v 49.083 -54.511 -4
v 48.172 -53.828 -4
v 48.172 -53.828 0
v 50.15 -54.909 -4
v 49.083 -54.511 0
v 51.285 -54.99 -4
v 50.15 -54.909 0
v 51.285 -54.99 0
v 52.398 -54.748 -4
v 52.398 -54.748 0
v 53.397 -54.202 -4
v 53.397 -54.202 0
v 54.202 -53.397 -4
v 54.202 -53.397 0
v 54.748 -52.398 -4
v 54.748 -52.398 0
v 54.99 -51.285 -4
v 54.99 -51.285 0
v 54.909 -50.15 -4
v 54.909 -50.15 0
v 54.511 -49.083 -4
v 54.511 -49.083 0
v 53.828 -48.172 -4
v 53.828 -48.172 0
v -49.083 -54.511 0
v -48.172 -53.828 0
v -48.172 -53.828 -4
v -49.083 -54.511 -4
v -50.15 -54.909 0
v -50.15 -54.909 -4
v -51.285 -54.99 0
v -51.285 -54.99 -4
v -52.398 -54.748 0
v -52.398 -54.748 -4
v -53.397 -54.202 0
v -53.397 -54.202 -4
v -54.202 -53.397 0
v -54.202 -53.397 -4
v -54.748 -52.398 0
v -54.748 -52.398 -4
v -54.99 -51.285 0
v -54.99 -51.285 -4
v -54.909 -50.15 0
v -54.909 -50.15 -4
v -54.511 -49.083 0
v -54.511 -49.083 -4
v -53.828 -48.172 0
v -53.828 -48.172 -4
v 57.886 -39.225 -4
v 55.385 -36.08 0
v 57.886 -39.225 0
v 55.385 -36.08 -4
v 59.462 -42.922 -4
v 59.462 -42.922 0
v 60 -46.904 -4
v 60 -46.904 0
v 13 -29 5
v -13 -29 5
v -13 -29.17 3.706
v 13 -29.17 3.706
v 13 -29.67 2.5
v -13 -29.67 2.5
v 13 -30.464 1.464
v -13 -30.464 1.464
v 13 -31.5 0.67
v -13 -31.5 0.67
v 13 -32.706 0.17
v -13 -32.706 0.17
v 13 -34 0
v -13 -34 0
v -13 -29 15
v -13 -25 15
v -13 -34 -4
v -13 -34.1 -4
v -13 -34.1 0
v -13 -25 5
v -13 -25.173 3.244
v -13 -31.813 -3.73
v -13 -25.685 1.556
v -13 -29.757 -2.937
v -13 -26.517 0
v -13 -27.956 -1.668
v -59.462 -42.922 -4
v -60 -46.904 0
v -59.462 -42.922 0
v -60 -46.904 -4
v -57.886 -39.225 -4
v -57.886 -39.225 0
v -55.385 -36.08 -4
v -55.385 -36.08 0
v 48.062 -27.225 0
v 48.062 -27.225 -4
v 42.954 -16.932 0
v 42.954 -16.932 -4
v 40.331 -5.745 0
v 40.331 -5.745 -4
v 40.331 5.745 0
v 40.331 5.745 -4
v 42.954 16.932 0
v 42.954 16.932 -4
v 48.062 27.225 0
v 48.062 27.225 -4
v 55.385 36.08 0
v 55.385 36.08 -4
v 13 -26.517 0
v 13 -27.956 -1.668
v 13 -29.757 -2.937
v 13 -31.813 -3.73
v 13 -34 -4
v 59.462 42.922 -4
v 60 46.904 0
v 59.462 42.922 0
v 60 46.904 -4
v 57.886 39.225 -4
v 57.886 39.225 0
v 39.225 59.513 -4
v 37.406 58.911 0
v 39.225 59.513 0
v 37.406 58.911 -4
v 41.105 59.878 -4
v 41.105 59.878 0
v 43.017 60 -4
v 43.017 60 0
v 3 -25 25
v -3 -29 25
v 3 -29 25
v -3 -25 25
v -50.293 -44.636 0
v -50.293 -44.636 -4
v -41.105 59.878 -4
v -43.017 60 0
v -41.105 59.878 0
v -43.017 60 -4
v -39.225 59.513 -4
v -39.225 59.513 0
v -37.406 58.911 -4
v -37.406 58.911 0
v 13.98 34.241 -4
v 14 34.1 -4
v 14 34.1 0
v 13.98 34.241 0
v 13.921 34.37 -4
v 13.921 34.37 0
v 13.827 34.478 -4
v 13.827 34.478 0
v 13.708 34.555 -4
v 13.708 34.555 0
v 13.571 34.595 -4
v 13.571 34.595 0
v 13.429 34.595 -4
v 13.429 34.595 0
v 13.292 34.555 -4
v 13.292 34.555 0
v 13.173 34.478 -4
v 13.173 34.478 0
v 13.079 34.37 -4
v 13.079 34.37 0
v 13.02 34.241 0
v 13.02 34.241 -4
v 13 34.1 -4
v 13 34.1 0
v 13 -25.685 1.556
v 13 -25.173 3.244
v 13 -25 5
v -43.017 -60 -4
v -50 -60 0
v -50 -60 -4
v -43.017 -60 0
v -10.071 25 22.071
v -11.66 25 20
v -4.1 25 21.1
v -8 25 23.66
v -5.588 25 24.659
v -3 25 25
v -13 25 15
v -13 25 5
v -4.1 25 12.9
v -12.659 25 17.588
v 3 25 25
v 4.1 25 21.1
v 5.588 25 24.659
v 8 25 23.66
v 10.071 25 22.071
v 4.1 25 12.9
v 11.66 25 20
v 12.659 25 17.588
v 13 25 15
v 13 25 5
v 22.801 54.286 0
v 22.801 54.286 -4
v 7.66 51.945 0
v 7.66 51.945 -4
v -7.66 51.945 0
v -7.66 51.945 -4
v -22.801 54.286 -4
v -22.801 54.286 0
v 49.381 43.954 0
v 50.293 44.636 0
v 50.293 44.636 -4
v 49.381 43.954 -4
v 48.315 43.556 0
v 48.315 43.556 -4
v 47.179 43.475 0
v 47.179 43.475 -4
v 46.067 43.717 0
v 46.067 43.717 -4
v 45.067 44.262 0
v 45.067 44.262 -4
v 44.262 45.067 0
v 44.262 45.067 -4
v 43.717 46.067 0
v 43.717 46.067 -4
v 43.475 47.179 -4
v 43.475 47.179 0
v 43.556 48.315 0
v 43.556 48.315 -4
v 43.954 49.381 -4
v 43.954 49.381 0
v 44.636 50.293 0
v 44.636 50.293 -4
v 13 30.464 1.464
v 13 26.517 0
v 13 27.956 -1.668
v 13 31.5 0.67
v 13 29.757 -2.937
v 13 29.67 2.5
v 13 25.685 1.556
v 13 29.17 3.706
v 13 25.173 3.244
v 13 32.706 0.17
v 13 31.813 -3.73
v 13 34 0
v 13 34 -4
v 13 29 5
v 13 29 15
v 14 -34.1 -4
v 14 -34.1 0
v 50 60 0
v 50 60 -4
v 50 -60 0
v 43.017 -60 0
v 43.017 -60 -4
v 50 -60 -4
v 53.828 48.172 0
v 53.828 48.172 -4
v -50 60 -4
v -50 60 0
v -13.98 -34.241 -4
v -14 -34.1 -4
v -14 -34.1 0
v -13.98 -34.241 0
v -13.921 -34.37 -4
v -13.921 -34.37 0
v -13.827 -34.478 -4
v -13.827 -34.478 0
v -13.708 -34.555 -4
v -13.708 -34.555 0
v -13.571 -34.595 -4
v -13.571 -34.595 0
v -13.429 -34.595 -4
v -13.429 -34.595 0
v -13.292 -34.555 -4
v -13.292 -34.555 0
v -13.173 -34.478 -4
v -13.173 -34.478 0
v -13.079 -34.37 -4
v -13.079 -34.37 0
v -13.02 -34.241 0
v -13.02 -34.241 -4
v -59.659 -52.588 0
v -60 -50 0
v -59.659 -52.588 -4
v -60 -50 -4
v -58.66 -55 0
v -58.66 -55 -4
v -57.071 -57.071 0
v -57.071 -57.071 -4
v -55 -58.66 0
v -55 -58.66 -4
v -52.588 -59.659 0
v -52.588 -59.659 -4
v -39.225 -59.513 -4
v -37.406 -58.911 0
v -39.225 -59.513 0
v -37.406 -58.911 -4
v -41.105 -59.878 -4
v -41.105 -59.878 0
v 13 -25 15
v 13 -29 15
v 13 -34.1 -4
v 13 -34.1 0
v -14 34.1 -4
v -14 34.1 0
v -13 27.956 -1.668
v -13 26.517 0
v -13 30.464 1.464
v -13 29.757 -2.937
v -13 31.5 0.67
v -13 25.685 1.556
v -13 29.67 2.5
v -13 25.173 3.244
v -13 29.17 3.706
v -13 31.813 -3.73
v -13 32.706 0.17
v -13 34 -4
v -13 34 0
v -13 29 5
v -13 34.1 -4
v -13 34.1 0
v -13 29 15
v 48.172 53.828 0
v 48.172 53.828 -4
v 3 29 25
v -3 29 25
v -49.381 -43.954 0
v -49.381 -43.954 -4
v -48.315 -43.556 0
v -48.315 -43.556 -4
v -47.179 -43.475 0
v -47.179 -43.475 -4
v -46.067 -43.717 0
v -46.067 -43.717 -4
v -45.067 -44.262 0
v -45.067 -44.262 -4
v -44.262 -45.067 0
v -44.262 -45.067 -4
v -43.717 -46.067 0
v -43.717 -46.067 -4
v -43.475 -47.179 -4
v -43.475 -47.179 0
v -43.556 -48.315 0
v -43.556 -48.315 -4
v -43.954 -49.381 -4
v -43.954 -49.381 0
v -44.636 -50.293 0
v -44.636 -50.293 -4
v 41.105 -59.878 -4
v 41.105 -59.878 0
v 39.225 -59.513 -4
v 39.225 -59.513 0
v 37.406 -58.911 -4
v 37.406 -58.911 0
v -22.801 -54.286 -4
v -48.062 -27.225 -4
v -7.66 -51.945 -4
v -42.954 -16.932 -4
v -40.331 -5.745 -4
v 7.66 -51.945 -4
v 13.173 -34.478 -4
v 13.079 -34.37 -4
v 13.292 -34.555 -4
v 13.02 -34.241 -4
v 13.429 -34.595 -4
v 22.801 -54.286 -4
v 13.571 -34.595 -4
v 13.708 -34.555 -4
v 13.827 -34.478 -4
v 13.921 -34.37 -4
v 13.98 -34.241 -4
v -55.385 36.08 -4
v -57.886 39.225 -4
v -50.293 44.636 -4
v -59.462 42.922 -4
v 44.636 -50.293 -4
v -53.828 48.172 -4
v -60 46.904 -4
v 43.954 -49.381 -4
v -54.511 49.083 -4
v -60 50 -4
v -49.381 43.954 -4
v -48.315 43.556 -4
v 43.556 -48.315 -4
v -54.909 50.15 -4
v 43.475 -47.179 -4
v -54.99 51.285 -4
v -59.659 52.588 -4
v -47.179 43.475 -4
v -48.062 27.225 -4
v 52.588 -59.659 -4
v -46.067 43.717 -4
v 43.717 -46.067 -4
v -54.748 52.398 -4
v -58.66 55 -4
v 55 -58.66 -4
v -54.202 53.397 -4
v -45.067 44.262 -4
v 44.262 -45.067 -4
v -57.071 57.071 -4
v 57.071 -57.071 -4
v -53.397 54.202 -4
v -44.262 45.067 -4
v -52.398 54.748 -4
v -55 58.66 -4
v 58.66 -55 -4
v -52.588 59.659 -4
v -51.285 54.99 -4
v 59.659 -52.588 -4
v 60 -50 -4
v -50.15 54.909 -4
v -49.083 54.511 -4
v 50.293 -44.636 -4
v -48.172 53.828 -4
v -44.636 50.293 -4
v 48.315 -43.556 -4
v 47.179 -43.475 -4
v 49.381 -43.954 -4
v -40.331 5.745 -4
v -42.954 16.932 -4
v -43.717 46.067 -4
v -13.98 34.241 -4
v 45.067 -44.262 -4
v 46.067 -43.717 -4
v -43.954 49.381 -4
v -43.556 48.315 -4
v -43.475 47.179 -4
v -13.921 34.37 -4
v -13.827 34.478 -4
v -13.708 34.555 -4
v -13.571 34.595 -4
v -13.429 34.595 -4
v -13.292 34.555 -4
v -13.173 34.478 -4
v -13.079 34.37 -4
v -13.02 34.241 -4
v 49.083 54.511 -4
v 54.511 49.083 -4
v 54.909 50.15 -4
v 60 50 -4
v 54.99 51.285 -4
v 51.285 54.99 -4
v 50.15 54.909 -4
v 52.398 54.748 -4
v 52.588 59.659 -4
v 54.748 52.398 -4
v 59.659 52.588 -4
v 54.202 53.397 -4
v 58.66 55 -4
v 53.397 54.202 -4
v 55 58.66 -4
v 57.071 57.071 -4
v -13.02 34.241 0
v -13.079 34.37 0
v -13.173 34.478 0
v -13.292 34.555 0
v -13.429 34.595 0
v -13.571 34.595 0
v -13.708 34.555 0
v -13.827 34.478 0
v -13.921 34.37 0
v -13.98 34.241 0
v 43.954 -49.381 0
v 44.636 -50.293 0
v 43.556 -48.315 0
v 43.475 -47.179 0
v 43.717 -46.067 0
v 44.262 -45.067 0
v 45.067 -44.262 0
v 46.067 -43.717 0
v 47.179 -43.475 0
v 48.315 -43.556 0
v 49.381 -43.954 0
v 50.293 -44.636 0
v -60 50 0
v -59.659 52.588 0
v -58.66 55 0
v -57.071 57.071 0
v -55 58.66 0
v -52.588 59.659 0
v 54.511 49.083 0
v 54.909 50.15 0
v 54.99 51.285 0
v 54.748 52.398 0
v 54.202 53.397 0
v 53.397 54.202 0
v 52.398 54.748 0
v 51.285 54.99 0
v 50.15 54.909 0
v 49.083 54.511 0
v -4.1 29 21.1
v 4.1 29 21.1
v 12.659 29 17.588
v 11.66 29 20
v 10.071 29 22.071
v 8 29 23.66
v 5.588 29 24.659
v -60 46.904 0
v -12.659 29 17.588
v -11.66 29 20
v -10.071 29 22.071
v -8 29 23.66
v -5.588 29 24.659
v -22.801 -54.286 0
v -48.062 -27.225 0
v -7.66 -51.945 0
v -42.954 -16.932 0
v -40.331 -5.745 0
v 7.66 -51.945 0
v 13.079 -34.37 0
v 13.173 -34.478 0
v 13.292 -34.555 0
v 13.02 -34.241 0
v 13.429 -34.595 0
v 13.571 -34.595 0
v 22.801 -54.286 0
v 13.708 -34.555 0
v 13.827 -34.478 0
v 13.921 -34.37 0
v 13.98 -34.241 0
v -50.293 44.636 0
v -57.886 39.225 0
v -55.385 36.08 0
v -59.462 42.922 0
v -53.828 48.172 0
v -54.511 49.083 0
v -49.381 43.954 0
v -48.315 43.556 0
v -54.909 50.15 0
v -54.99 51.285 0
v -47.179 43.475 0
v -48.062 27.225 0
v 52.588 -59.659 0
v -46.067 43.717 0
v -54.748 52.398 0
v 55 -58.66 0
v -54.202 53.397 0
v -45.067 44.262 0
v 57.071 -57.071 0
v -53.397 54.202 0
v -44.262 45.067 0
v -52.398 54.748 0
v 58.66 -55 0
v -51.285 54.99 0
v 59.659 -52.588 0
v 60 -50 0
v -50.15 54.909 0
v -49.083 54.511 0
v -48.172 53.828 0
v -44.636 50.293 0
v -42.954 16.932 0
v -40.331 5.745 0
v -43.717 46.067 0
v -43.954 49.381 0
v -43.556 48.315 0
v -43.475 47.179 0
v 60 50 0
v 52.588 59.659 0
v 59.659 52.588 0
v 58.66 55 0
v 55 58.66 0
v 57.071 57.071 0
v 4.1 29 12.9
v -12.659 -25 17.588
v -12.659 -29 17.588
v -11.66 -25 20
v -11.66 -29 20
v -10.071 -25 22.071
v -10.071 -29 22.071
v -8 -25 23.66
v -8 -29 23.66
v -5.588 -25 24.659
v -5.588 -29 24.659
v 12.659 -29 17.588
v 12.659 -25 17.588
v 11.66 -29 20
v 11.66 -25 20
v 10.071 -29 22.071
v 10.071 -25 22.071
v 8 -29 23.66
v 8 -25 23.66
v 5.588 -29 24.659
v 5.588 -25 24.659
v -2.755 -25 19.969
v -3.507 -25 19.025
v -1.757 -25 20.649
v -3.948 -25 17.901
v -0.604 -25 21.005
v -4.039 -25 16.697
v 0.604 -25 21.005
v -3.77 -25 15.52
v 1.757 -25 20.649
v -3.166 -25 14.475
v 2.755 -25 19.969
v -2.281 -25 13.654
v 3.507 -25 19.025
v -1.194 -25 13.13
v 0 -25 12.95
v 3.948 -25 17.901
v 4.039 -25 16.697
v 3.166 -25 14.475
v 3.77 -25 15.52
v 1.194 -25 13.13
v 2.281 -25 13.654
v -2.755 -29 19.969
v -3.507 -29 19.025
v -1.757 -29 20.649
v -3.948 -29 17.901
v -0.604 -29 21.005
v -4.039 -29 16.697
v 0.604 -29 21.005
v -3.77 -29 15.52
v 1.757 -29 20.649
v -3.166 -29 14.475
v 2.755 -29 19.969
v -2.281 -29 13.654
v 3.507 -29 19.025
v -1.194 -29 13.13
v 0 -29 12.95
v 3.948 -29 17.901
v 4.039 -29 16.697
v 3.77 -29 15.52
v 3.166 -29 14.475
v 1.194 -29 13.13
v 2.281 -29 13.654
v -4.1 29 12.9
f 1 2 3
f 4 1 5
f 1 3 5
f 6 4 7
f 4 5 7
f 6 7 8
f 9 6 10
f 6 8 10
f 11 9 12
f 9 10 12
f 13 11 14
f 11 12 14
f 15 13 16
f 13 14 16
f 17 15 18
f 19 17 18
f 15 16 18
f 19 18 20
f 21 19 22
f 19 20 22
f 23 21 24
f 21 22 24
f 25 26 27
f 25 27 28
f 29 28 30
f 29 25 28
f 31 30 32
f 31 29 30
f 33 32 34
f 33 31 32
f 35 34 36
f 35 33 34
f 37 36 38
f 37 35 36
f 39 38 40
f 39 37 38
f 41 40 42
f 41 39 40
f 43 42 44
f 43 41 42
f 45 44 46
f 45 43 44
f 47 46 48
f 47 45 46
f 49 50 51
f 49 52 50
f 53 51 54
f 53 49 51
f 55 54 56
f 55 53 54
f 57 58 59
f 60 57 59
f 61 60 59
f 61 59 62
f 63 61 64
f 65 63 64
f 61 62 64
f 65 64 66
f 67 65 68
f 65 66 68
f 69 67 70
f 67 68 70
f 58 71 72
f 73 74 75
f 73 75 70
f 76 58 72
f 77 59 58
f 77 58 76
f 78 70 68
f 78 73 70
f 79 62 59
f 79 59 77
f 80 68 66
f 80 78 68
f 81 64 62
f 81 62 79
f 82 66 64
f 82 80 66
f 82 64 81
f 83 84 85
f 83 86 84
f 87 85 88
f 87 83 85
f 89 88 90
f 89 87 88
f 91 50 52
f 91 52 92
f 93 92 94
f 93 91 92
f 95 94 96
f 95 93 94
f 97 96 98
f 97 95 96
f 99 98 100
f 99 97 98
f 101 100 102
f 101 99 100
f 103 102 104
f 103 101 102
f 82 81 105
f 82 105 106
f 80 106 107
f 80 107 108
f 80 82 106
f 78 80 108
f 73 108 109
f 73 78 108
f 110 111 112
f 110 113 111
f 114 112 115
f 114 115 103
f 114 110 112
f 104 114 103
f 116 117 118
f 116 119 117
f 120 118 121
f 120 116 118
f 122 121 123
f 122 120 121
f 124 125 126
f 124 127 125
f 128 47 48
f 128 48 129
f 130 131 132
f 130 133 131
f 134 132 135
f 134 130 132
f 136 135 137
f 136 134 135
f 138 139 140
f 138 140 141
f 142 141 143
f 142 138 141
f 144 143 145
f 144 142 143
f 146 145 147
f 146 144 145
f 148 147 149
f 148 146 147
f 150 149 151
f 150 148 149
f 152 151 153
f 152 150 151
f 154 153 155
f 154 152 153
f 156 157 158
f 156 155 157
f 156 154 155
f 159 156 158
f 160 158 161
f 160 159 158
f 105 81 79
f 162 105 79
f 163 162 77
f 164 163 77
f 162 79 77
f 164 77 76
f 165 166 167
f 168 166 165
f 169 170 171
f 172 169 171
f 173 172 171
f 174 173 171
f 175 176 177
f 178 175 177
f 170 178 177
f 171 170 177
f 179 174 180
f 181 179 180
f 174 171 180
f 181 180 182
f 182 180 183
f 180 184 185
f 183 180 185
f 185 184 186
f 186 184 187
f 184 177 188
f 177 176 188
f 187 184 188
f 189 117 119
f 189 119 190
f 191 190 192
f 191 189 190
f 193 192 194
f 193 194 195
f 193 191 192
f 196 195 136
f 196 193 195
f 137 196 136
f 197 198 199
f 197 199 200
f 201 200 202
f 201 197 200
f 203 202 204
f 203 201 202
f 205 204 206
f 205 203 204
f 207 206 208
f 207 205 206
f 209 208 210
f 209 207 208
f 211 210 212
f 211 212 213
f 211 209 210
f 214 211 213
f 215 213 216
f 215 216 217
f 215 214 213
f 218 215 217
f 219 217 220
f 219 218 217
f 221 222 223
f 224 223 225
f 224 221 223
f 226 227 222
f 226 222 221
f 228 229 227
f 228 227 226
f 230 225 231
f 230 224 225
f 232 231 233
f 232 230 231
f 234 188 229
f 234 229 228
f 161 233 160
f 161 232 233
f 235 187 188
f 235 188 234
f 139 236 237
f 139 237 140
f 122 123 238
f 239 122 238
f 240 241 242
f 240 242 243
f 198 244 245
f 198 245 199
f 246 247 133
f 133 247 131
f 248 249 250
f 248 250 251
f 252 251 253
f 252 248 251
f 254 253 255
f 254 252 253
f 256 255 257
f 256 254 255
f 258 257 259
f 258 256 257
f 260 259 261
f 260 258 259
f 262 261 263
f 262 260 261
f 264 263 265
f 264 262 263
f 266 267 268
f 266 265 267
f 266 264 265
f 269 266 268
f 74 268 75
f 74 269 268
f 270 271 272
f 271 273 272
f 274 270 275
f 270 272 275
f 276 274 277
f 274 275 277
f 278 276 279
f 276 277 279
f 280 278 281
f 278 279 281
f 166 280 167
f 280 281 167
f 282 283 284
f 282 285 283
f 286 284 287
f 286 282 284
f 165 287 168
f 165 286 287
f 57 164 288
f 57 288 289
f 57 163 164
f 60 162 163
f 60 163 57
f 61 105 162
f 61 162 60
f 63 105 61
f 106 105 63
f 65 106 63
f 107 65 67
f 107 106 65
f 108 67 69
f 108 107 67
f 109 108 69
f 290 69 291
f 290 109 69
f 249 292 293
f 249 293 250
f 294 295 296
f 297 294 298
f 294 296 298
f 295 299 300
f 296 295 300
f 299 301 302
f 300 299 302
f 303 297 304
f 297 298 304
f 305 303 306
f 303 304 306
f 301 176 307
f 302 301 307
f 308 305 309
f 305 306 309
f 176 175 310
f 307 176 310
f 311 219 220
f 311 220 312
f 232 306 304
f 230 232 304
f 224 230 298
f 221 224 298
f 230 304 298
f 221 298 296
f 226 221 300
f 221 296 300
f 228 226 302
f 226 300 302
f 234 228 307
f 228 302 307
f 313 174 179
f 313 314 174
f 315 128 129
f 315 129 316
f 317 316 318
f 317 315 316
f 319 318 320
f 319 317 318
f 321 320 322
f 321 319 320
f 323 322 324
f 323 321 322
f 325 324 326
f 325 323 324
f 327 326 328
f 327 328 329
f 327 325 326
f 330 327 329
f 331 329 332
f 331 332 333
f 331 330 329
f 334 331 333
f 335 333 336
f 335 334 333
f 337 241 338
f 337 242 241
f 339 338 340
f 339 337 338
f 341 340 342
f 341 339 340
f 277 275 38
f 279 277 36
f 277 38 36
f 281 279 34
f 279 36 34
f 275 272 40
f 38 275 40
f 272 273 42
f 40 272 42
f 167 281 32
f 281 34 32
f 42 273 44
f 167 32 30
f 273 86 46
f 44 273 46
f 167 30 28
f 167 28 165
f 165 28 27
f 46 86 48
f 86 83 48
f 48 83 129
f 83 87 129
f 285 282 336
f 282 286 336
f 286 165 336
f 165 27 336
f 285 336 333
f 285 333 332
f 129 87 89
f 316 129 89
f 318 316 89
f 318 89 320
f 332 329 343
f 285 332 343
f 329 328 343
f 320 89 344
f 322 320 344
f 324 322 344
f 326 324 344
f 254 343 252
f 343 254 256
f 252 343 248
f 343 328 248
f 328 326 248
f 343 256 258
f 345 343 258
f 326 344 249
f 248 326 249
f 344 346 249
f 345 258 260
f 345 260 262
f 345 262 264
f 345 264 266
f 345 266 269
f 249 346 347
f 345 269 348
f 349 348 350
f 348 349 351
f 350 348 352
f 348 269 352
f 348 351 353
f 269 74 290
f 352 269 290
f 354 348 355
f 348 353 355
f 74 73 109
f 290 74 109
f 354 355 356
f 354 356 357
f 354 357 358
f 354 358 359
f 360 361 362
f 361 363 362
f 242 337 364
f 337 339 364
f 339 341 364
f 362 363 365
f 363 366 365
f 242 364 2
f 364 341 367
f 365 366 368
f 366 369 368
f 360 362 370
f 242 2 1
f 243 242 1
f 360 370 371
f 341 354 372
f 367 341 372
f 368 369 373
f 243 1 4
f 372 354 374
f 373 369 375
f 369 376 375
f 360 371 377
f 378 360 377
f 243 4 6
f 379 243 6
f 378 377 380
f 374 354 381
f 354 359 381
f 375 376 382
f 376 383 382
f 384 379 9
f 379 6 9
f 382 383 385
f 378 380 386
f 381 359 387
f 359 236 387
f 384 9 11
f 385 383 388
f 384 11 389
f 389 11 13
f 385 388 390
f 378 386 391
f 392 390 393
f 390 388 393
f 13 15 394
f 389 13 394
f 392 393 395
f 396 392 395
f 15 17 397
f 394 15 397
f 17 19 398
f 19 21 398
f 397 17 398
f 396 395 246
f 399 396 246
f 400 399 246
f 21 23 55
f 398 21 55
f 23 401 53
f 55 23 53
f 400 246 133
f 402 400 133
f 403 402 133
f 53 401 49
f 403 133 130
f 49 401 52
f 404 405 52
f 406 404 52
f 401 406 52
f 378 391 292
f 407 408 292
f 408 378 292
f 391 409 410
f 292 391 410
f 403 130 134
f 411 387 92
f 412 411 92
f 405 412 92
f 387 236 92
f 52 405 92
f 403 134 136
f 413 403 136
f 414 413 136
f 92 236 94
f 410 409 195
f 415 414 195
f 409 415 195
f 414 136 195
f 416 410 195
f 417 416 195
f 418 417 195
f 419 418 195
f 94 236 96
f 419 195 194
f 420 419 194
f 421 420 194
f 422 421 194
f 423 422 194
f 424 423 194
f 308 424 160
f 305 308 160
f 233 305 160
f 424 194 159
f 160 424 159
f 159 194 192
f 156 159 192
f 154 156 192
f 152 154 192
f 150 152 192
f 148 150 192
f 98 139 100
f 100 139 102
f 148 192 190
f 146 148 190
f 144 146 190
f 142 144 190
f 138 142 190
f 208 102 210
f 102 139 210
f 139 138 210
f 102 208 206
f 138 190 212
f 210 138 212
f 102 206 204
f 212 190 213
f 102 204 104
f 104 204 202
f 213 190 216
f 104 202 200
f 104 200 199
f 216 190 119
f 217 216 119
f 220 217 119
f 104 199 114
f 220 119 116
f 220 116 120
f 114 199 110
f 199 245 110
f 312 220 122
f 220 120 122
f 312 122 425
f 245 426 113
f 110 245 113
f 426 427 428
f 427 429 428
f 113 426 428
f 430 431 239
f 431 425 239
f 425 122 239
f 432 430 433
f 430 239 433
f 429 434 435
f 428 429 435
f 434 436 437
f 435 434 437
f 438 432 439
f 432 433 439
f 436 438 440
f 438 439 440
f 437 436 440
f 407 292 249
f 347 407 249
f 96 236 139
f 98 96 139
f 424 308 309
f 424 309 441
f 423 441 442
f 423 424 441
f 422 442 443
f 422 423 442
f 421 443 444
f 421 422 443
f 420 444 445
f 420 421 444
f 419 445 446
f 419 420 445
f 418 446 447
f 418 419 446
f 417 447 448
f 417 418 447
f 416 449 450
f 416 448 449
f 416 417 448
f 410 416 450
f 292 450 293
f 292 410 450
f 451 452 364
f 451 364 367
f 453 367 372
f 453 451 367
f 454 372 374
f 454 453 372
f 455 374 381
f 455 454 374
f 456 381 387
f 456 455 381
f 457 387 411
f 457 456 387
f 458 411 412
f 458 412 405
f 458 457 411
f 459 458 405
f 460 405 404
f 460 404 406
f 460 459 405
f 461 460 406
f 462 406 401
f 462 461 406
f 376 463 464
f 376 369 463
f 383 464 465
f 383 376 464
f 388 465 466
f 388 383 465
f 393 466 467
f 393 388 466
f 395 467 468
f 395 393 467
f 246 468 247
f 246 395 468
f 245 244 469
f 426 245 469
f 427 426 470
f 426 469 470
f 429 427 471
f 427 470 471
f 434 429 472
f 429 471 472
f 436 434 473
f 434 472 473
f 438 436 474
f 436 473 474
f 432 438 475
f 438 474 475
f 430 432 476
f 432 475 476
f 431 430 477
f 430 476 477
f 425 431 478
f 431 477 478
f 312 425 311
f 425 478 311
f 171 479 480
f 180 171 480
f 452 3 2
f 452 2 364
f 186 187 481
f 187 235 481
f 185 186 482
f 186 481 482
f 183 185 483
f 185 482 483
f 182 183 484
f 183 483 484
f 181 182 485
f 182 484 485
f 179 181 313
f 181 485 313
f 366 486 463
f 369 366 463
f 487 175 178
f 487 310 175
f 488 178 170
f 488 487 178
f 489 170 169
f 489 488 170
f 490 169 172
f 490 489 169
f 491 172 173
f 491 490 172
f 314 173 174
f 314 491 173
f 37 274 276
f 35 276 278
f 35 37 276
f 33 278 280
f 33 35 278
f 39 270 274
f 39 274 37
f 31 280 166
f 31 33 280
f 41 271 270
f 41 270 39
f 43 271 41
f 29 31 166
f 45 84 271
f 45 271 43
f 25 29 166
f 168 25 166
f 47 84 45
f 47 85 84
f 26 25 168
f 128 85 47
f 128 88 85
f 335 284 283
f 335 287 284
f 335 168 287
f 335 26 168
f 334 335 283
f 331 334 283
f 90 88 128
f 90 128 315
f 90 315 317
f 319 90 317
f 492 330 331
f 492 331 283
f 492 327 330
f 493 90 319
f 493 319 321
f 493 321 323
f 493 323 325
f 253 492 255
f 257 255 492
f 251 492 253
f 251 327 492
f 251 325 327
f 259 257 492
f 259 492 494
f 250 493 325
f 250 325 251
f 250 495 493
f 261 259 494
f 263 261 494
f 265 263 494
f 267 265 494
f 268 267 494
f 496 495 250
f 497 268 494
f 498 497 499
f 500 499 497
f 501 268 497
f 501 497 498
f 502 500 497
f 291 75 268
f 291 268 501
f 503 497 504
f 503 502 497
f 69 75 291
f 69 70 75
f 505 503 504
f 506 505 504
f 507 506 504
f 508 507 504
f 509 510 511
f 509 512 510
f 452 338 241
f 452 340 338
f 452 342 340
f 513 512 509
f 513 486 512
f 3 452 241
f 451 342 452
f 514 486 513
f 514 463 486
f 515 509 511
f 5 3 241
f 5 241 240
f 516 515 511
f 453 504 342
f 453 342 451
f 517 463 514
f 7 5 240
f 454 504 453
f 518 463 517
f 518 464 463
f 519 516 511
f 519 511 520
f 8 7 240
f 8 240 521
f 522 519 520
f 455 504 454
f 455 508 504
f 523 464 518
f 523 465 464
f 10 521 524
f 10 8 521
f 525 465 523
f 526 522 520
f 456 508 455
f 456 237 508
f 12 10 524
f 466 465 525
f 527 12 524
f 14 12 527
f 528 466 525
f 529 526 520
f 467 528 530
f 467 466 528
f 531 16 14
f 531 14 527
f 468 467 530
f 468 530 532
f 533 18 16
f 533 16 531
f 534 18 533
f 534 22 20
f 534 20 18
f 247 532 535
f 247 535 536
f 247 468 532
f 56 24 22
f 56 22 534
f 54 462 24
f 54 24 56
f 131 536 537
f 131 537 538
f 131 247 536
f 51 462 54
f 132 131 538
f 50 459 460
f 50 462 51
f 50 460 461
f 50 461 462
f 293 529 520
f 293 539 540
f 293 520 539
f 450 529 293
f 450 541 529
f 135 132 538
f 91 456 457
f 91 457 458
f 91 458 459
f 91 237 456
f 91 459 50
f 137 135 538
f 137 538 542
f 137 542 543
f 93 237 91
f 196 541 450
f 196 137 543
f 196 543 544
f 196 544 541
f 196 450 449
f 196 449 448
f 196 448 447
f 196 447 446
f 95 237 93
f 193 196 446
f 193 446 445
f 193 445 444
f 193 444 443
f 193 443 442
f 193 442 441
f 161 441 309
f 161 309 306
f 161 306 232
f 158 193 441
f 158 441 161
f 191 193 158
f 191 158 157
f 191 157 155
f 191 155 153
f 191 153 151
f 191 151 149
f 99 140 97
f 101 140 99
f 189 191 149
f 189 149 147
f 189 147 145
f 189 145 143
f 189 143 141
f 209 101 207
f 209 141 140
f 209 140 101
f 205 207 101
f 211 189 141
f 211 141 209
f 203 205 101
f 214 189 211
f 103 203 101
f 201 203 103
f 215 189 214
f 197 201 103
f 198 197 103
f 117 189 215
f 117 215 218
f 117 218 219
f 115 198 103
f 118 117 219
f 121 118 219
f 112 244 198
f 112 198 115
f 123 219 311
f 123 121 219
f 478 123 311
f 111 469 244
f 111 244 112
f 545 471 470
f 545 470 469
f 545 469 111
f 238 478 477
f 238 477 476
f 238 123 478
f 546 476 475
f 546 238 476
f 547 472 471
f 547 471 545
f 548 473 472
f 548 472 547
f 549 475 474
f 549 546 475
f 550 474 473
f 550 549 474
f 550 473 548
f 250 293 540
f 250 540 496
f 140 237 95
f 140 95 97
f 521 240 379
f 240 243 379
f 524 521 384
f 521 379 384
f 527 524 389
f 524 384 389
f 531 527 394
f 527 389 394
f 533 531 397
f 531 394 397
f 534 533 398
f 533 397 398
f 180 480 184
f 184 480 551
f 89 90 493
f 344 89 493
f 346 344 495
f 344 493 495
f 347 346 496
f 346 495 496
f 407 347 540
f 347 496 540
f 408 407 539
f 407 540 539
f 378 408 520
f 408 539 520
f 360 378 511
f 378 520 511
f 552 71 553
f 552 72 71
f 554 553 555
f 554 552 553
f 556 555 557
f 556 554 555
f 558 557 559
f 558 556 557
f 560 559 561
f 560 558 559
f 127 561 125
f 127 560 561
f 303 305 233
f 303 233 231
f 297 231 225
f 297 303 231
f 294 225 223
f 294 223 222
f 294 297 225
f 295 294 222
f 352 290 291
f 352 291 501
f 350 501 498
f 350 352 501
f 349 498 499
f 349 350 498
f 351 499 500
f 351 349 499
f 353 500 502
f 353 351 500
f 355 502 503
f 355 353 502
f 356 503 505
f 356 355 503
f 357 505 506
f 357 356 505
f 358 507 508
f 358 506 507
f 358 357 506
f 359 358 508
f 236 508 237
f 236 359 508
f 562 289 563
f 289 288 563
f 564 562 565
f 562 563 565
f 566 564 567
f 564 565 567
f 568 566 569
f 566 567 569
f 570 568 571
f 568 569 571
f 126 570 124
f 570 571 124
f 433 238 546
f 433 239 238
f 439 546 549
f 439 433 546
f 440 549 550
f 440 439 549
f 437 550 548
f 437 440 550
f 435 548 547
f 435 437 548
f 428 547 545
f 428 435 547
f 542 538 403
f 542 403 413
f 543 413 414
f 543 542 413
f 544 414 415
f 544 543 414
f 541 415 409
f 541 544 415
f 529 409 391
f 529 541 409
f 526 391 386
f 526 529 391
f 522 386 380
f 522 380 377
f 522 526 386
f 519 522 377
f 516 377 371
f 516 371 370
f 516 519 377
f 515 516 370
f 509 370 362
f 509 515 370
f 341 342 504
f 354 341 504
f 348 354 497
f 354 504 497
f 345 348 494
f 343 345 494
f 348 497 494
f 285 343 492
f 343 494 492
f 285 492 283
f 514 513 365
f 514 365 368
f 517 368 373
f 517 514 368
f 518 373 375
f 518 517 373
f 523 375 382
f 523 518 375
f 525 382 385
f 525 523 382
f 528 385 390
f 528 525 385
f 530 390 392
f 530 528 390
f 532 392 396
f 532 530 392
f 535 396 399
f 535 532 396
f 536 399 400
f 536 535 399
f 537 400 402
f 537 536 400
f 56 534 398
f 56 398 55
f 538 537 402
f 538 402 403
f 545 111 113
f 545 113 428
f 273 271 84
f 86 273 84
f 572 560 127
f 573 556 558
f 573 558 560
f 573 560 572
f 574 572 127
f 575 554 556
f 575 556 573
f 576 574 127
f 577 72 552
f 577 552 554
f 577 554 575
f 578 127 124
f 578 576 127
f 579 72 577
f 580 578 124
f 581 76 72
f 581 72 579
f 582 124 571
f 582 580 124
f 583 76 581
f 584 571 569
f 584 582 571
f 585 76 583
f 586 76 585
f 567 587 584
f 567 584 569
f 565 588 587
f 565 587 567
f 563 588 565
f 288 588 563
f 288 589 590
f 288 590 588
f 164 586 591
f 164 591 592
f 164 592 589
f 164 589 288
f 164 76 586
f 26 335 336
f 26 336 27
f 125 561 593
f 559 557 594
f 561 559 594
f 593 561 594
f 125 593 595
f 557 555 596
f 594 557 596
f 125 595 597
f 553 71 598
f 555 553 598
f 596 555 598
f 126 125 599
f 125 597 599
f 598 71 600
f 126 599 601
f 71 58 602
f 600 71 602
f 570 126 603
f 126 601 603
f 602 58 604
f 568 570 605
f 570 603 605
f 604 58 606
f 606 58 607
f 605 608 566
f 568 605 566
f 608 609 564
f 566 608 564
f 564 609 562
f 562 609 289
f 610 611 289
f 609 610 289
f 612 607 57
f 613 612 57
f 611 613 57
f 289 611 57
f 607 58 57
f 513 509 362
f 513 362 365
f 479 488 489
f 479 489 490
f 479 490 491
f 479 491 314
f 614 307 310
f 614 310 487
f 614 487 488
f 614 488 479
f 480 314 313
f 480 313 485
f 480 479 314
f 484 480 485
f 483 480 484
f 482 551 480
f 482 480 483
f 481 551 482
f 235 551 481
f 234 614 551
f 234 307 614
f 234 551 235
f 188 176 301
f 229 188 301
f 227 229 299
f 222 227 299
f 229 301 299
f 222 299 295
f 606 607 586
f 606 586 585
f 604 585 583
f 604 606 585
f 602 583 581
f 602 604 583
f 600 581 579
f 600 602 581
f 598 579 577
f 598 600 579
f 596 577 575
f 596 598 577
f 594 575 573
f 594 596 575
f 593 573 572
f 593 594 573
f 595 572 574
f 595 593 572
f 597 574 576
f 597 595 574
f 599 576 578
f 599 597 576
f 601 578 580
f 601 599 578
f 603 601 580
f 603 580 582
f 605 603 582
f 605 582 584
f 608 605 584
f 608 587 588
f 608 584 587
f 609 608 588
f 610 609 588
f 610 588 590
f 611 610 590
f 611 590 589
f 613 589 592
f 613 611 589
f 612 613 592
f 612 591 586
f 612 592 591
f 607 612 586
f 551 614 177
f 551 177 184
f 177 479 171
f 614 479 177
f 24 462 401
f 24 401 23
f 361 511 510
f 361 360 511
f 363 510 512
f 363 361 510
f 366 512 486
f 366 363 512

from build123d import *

# Parameters (mm, degrees)
SKETCH_1_W                   = 120
SKETCH_1_H                   = 120
SKETCH_1_W_2                 = 28
SKETCH_1_H_2                 = 50
SM_BASE_FLANGE_1_DEPTH       = 4
SM_START                     = -5
SM_EDGE_FLANGE_1_DEPTH       = 10
SM_EDGE_FLANGE_1_2_OUTLINE_W = 26
SM_EDGE_FLANGE_1_2_OUTLINE_H = 4
SM_EDGE_FLANGE_1_2_DEPTH     = 1.41096
SM_START_2                   = 5
SM_EDGE_FLANGE_1_3_OUTLINE_W = 26
SM_EDGE_FLANGE_1_3_OUTLINE_H = 4
SM_EDGE_FLANGE_1_3_DEPTH     = 20
SM_START_3                   = -13
SM_EDGE_FLANGE_1_4_DEPTH     = 26
SM_EDGE_FLANGE_1_5_DEPTH     = 26
CUT_EXTRUDE_1_DEPTH          = 89.459030065
CUT_EXTRUDE_1_DEPTH_BACK     = 89.459030065
SKETCH_10_R                  = 4.05
SKETCH_12_W                  = 8.2
SKETCH_12_H                  = 8.2
CUT_EXTRUDE_3_DEPTH          = 4
FILLET_1_R                   = 10
SKETCH_11_R                  = 4
CUT_EXTRUDE_2_DEPTH          = 4
CUT_EXTRUDE_4_DEPTH          = 4
CUT_EXTRUDE_5_DEPTH          = 4
FILLET_2_R                   = 15


with BuildPart() as part:
    # Базовая кромка1: sheet metal written as solids
    # Sketch 1 → Базовая кромка1 (new body)
    with BuildSketch(Plane.XY):
        Rectangle(SKETCH_1_W, SKETCH_1_H)
        Rectangle(SKETCH_1_W_2, SKETCH_1_H_2, mode=Mode.SUBTRACT)
    extrude(amount=-SM_BASE_FLANGE_1_DEPTH)

    # Ребро-кромка1: read off the stored shape, not the designer's step
    # Ребро-кромка1 outline → Ребро-кромка1 (cut)
    with BuildSketch(Plane.XY.offset(SM_START)):
        with BuildLine():
            ThreePointArc((-13, 34.1), (-13.5, 34.6), (-14, 34.1))
            Line((-14, 34.1), (-14, 25))
            Line((-14, 25), (-13, 25))
            Line((-13, 25), (-13, 34.1))
        make_face()
        with BuildLine():
            Line((-13, -25), (-14, -25))
            Line((-14, -25), (-14, -34.1))
            ThreePointArc((-14, -34.1), (-13.5, -34.6), (-13, -34.1))
            Line((-13, -34.1), (-13, -25))
        make_face()
        with BuildLine():
            Line((13, 34.1), (13, 25))
            Line((13, 25), (14, 25))
            Line((14, 25), (14, 34.1))
            ThreePointArc((14, 34.1), (13.5, 34.6), (13, 34.1))
        make_face()
        with BuildLine():
            Line((14, -25), (13, -25))
            Line((13, -25), (13, -34.1))
            ThreePointArc((13, -34.1), (13.5, -34.6), (14, -34.1))
            Line((14, -34.1), (14, -25))
        make_face()
    extrude(amount=SM_EDGE_FLANGE_1_DEPTH, mode=Mode.SUBTRACT)

    # Sm Edge Flange 1 2 outline → Sm Edge Flange 1 2 (cut)
    with BuildSketch(Plane.XY.offset(SM_START)):
        with Locations((0, 27)):
            Rectangle(SM_EDGE_FLANGE_1_2_OUTLINE_W, SM_EDGE_FLANGE_1_2_OUTLINE_H)
        with Locations((0, -27)):
            Rectangle(SM_EDGE_FLANGE_1_2_OUTLINE_W, SM_EDGE_FLANGE_1_2_OUTLINE_H)
    extrude(amount=SM_EDGE_FLANGE_1_2_DEPTH, mode=Mode.SUBTRACT)

    # Sm Edge Flange 1 4 outline → Sm Edge Flange 1 4 (cut)
    with BuildSketch(Plane.YZ.offset(SM_START_3)):
        with BuildLine():
            ThreePointArc((34, -4), (29.757359313, -2.937253933), (26.516685226, 0))
            Line((26.516685226, 0), (25, 0))
            Line((25, 0), (25, -3.58904))
            Line((25, -3.58904), (29, -3.58904))
            Line((29, -3.58904), (29, -4))
            Line((29, -4), (34, -4))
        make_face()
        with BuildLine():
            Line((-25, -3.58904), (-25, 0))
            Line((-25, 0), (-26.516685226, 0))
            ThreePointArc((-26.516685226, 0), (-29.757359313, -2.937253933), (-34, -4))
            Line((-34, -4), (-29, -4))
            Line((-29, -4), (-29, -3.58904))
            Line((-29, -3.58904), (-25, -3.58904))
        make_face()
    extrude(amount=SM_EDGE_FLANGE_1_4_DEPTH, mode=Mode.SUBTRACT)



with BuildPart() as body_2:
    # Sm Edge Flange 1 3 outline → Sm Edge Flange 1 3 (new body)
    with BuildSketch(Plane.XY.offset(SM_START_2)):
        with Locations((0, 27)):
            Rectangle(SM_EDGE_FLANGE_1_3_OUTLINE_W, SM_EDGE_FLANGE_1_3_OUTLINE_H)
        with Locations((0, -27)):
            Rectangle(SM_EDGE_FLANGE_1_3_OUTLINE_W, SM_EDGE_FLANGE_1_3_OUTLINE_H)
    extrude(amount=SM_EDGE_FLANGE_1_3_DEPTH)


with BuildPart() as part_1:
    add(part.part)

    add(body_2.part)  # Sm Edge Flange 1 5 merges body 2
    # Sm Edge Flange 1 5 outline → Sm Edge Flange 1 5 (add)
    with BuildSketch(Plane.YZ.offset(SM_START_3)):
        with BuildLine():
            Line((29, 5), (25, 5))
            ThreePointArc((25, 5), (25.38751392, 2.38751392), (26.516685226, 0))
            Line((26.516685226, 0), (34, 0))
            ThreePointArc((34, 0), (30.464466094, 1.464466094), (29, 5))
        make_face()
        with BuildLine():
            Line((-34, 0), (-26.516685226, 0))
            ThreePointArc((-26.516685226, 0), (-25.38751392, 2.38751392), (-25, 5))
            Line((-25, 5), (-29, 5))
            ThreePointArc((-29, 5), (-30.464466094, 1.464466094), (-34, 0))
        make_face()
    extrude(amount=SM_EDGE_FLANGE_1_5_DEPTH)

    # Эскиз10 → Вырез-Вытянуть1 (cut, two sides: drawn at the far end of the back side and taken through both)
    with BuildSketch(Plane(origin=(0, 0, 0), x_dir=(1, 0, 0), z_dir=(0, 1, 0)).offset(-CUT_EXTRUDE_1_DEPTH_BACK)):
        with Locations(Location((0, -17, 0), (0, 0, 90))):
            Circle(SKETCH_10_R)
    extrude(amount=CUT_EXTRUDE_1_DEPTH + CUT_EXTRUDE_1_DEPTH_BACK, mode=Mode.SUBTRACT)

    # Эскиз12 → Вырез-Вытянуть3 (cut)
    with BuildSketch(Plane(origin=(0, 29, 0), x_dir=(1, 0, 0), z_dir=(0, 1, 0))):
        with Locations((0, -17)):
            Rectangle(SKETCH_12_W, SKETCH_12_H)
    extrude(amount=-CUT_EXTRUDE_3_DEPTH, mode=Mode.SUBTRACT)

    # Скругление1
    fillet_1_edges = [part_1.edges().sort_by_distance(p)[0] for p in [
        (13, -27, 25),
        (-13, -27, 25),
        (-60, 60, -2),
        (60, 60, -2),
        (60, -60, -2),
        (-60, -60, -2),
        (-13, 27, 25),
        (13, 27, 25),
    ]]
    fillet(fillet_1_edges, radius=FILLET_1_R)

    # Эскиз11 → Вырез-Вытянуть2 (cut)
    with BuildSketch(Plane.XY):
        with Locations((-51, 51)):
            Circle(SKETCH_11_R)
        with Locations((51, 51)):
            Circle(SKETCH_11_R)
        with Locations((-51, -51)):
            Circle(SKETCH_11_R)
        with Locations((51, -51)):
            Circle(SKETCH_11_R)
    extrude(amount=-CUT_EXTRUDE_2_DEPTH, mode=Mode.SUBTRACT)

    # Эскиз13 → Вырез-Вытянуть4 (cut)
    with BuildSketch(Plane.XY):
        with BuildLine():
            Line((-48.171572875, 53.828427125), (-44.636038969, 50.292893219))
            ThreePointArc((-44.636038969, 50.292893219), (-44.636038969, 44.636038969), (-50.292893219, 44.636038969))
            Line((-50.292893219, 44.636038969), (-53.828427125, 48.171572875))
            ThreePointArc((-53.828427125, 48.171572875), (-53.828427125, 53.828427125), (-48.171572875, 53.828427125))
        make_face()
        with BuildLine():
            Line((53.828427125, 48.171572875), (50.292893219, 44.636038969))
            ThreePointArc((50.292893219, 44.636038969), (44.636038969, 44.636038969), (44.636038969, 50.292893219))
            Line((44.636038969, 50.292893219), (48.171572875, 53.828427125))
            ThreePointArc((48.171572875, 53.828427125), (53.828427125, 53.828427125), (53.828427125, 48.171572875))
        make_face()
        with BuildLine():
            Line((-53.828427125, -48.171572875), (-50.292893219, -44.636038969))
            ThreePointArc((-50.292893219, -44.636038969), (-44.636038969, -44.636038969), (-44.636038969, -50.292893219))
            Line((-44.636038969, -50.292893219), (-48.171572875, -53.828427125))
            ThreePointArc((-48.171572875, -53.828427125), (-53.828427125, -53.828427125), (-53.828427125, -48.171572875))
        make_face()
        with BuildLine():
            Line((48.171572875, -53.828427125), (44.636038969, -50.292893219))
            ThreePointArc((44.636038969, -50.292893219), (44.636038969, -44.636038969), (50.292893219, -44.636038969))
            Line((50.292893219, -44.636038969), (53.828427125, -48.171572875))
            ThreePointArc((53.828427125, -48.171572875), (53.828427125, -53.828427125), (48.171572875, -53.828427125))
        make_face()
    extrude(amount=-CUT_EXTRUDE_4_DEPTH, mode=Mode.SUBTRACT)

    # Эскиз14 → Вырез-Вытянуть5 (cut)
    with BuildSketch(Plane.XY):
        with BuildLine():
            Line((-60, 40), (-60, -40))
            ThreePointArc((-60, -40), (-40, 0), (-60, 40))
        make_face()
        with BuildLine():
            Line((60, 40), (60, -40))
            ThreePointArc((60, -40), (40, 0), (60, 40))
        make_face()
        with BuildLine():
            Line((-40, 60), (40, 60))
            ThreePointArc((40, 60), (0, 51.651513899), (-40, 60))
        make_face()
        with BuildLine():
            Line((-40, -60), (40, -60))
            ThreePointArc((40, -60), (0, -51.651513899), (-40, -60))
        make_face()
    extrude(amount=-CUT_EXTRUDE_5_DEPTH, mode=Mode.SUBTRACT)

    # Скругление2
    fillet_2_edges = [part_1.edges().sort_by_distance(p)[0] for p in [
        (40, 60, -2),
        (-40, 60, -2),
        (60, -40, -2),
        (60, 40, -2),
        (-40, -60, -2),
        (40, -60, -2),
        (-60, 40, -2),
        (-60, -40, -2),
    ]]
    fillet(fillet_2_edges, radius=FILLET_2_R)


solid = part_1.part
